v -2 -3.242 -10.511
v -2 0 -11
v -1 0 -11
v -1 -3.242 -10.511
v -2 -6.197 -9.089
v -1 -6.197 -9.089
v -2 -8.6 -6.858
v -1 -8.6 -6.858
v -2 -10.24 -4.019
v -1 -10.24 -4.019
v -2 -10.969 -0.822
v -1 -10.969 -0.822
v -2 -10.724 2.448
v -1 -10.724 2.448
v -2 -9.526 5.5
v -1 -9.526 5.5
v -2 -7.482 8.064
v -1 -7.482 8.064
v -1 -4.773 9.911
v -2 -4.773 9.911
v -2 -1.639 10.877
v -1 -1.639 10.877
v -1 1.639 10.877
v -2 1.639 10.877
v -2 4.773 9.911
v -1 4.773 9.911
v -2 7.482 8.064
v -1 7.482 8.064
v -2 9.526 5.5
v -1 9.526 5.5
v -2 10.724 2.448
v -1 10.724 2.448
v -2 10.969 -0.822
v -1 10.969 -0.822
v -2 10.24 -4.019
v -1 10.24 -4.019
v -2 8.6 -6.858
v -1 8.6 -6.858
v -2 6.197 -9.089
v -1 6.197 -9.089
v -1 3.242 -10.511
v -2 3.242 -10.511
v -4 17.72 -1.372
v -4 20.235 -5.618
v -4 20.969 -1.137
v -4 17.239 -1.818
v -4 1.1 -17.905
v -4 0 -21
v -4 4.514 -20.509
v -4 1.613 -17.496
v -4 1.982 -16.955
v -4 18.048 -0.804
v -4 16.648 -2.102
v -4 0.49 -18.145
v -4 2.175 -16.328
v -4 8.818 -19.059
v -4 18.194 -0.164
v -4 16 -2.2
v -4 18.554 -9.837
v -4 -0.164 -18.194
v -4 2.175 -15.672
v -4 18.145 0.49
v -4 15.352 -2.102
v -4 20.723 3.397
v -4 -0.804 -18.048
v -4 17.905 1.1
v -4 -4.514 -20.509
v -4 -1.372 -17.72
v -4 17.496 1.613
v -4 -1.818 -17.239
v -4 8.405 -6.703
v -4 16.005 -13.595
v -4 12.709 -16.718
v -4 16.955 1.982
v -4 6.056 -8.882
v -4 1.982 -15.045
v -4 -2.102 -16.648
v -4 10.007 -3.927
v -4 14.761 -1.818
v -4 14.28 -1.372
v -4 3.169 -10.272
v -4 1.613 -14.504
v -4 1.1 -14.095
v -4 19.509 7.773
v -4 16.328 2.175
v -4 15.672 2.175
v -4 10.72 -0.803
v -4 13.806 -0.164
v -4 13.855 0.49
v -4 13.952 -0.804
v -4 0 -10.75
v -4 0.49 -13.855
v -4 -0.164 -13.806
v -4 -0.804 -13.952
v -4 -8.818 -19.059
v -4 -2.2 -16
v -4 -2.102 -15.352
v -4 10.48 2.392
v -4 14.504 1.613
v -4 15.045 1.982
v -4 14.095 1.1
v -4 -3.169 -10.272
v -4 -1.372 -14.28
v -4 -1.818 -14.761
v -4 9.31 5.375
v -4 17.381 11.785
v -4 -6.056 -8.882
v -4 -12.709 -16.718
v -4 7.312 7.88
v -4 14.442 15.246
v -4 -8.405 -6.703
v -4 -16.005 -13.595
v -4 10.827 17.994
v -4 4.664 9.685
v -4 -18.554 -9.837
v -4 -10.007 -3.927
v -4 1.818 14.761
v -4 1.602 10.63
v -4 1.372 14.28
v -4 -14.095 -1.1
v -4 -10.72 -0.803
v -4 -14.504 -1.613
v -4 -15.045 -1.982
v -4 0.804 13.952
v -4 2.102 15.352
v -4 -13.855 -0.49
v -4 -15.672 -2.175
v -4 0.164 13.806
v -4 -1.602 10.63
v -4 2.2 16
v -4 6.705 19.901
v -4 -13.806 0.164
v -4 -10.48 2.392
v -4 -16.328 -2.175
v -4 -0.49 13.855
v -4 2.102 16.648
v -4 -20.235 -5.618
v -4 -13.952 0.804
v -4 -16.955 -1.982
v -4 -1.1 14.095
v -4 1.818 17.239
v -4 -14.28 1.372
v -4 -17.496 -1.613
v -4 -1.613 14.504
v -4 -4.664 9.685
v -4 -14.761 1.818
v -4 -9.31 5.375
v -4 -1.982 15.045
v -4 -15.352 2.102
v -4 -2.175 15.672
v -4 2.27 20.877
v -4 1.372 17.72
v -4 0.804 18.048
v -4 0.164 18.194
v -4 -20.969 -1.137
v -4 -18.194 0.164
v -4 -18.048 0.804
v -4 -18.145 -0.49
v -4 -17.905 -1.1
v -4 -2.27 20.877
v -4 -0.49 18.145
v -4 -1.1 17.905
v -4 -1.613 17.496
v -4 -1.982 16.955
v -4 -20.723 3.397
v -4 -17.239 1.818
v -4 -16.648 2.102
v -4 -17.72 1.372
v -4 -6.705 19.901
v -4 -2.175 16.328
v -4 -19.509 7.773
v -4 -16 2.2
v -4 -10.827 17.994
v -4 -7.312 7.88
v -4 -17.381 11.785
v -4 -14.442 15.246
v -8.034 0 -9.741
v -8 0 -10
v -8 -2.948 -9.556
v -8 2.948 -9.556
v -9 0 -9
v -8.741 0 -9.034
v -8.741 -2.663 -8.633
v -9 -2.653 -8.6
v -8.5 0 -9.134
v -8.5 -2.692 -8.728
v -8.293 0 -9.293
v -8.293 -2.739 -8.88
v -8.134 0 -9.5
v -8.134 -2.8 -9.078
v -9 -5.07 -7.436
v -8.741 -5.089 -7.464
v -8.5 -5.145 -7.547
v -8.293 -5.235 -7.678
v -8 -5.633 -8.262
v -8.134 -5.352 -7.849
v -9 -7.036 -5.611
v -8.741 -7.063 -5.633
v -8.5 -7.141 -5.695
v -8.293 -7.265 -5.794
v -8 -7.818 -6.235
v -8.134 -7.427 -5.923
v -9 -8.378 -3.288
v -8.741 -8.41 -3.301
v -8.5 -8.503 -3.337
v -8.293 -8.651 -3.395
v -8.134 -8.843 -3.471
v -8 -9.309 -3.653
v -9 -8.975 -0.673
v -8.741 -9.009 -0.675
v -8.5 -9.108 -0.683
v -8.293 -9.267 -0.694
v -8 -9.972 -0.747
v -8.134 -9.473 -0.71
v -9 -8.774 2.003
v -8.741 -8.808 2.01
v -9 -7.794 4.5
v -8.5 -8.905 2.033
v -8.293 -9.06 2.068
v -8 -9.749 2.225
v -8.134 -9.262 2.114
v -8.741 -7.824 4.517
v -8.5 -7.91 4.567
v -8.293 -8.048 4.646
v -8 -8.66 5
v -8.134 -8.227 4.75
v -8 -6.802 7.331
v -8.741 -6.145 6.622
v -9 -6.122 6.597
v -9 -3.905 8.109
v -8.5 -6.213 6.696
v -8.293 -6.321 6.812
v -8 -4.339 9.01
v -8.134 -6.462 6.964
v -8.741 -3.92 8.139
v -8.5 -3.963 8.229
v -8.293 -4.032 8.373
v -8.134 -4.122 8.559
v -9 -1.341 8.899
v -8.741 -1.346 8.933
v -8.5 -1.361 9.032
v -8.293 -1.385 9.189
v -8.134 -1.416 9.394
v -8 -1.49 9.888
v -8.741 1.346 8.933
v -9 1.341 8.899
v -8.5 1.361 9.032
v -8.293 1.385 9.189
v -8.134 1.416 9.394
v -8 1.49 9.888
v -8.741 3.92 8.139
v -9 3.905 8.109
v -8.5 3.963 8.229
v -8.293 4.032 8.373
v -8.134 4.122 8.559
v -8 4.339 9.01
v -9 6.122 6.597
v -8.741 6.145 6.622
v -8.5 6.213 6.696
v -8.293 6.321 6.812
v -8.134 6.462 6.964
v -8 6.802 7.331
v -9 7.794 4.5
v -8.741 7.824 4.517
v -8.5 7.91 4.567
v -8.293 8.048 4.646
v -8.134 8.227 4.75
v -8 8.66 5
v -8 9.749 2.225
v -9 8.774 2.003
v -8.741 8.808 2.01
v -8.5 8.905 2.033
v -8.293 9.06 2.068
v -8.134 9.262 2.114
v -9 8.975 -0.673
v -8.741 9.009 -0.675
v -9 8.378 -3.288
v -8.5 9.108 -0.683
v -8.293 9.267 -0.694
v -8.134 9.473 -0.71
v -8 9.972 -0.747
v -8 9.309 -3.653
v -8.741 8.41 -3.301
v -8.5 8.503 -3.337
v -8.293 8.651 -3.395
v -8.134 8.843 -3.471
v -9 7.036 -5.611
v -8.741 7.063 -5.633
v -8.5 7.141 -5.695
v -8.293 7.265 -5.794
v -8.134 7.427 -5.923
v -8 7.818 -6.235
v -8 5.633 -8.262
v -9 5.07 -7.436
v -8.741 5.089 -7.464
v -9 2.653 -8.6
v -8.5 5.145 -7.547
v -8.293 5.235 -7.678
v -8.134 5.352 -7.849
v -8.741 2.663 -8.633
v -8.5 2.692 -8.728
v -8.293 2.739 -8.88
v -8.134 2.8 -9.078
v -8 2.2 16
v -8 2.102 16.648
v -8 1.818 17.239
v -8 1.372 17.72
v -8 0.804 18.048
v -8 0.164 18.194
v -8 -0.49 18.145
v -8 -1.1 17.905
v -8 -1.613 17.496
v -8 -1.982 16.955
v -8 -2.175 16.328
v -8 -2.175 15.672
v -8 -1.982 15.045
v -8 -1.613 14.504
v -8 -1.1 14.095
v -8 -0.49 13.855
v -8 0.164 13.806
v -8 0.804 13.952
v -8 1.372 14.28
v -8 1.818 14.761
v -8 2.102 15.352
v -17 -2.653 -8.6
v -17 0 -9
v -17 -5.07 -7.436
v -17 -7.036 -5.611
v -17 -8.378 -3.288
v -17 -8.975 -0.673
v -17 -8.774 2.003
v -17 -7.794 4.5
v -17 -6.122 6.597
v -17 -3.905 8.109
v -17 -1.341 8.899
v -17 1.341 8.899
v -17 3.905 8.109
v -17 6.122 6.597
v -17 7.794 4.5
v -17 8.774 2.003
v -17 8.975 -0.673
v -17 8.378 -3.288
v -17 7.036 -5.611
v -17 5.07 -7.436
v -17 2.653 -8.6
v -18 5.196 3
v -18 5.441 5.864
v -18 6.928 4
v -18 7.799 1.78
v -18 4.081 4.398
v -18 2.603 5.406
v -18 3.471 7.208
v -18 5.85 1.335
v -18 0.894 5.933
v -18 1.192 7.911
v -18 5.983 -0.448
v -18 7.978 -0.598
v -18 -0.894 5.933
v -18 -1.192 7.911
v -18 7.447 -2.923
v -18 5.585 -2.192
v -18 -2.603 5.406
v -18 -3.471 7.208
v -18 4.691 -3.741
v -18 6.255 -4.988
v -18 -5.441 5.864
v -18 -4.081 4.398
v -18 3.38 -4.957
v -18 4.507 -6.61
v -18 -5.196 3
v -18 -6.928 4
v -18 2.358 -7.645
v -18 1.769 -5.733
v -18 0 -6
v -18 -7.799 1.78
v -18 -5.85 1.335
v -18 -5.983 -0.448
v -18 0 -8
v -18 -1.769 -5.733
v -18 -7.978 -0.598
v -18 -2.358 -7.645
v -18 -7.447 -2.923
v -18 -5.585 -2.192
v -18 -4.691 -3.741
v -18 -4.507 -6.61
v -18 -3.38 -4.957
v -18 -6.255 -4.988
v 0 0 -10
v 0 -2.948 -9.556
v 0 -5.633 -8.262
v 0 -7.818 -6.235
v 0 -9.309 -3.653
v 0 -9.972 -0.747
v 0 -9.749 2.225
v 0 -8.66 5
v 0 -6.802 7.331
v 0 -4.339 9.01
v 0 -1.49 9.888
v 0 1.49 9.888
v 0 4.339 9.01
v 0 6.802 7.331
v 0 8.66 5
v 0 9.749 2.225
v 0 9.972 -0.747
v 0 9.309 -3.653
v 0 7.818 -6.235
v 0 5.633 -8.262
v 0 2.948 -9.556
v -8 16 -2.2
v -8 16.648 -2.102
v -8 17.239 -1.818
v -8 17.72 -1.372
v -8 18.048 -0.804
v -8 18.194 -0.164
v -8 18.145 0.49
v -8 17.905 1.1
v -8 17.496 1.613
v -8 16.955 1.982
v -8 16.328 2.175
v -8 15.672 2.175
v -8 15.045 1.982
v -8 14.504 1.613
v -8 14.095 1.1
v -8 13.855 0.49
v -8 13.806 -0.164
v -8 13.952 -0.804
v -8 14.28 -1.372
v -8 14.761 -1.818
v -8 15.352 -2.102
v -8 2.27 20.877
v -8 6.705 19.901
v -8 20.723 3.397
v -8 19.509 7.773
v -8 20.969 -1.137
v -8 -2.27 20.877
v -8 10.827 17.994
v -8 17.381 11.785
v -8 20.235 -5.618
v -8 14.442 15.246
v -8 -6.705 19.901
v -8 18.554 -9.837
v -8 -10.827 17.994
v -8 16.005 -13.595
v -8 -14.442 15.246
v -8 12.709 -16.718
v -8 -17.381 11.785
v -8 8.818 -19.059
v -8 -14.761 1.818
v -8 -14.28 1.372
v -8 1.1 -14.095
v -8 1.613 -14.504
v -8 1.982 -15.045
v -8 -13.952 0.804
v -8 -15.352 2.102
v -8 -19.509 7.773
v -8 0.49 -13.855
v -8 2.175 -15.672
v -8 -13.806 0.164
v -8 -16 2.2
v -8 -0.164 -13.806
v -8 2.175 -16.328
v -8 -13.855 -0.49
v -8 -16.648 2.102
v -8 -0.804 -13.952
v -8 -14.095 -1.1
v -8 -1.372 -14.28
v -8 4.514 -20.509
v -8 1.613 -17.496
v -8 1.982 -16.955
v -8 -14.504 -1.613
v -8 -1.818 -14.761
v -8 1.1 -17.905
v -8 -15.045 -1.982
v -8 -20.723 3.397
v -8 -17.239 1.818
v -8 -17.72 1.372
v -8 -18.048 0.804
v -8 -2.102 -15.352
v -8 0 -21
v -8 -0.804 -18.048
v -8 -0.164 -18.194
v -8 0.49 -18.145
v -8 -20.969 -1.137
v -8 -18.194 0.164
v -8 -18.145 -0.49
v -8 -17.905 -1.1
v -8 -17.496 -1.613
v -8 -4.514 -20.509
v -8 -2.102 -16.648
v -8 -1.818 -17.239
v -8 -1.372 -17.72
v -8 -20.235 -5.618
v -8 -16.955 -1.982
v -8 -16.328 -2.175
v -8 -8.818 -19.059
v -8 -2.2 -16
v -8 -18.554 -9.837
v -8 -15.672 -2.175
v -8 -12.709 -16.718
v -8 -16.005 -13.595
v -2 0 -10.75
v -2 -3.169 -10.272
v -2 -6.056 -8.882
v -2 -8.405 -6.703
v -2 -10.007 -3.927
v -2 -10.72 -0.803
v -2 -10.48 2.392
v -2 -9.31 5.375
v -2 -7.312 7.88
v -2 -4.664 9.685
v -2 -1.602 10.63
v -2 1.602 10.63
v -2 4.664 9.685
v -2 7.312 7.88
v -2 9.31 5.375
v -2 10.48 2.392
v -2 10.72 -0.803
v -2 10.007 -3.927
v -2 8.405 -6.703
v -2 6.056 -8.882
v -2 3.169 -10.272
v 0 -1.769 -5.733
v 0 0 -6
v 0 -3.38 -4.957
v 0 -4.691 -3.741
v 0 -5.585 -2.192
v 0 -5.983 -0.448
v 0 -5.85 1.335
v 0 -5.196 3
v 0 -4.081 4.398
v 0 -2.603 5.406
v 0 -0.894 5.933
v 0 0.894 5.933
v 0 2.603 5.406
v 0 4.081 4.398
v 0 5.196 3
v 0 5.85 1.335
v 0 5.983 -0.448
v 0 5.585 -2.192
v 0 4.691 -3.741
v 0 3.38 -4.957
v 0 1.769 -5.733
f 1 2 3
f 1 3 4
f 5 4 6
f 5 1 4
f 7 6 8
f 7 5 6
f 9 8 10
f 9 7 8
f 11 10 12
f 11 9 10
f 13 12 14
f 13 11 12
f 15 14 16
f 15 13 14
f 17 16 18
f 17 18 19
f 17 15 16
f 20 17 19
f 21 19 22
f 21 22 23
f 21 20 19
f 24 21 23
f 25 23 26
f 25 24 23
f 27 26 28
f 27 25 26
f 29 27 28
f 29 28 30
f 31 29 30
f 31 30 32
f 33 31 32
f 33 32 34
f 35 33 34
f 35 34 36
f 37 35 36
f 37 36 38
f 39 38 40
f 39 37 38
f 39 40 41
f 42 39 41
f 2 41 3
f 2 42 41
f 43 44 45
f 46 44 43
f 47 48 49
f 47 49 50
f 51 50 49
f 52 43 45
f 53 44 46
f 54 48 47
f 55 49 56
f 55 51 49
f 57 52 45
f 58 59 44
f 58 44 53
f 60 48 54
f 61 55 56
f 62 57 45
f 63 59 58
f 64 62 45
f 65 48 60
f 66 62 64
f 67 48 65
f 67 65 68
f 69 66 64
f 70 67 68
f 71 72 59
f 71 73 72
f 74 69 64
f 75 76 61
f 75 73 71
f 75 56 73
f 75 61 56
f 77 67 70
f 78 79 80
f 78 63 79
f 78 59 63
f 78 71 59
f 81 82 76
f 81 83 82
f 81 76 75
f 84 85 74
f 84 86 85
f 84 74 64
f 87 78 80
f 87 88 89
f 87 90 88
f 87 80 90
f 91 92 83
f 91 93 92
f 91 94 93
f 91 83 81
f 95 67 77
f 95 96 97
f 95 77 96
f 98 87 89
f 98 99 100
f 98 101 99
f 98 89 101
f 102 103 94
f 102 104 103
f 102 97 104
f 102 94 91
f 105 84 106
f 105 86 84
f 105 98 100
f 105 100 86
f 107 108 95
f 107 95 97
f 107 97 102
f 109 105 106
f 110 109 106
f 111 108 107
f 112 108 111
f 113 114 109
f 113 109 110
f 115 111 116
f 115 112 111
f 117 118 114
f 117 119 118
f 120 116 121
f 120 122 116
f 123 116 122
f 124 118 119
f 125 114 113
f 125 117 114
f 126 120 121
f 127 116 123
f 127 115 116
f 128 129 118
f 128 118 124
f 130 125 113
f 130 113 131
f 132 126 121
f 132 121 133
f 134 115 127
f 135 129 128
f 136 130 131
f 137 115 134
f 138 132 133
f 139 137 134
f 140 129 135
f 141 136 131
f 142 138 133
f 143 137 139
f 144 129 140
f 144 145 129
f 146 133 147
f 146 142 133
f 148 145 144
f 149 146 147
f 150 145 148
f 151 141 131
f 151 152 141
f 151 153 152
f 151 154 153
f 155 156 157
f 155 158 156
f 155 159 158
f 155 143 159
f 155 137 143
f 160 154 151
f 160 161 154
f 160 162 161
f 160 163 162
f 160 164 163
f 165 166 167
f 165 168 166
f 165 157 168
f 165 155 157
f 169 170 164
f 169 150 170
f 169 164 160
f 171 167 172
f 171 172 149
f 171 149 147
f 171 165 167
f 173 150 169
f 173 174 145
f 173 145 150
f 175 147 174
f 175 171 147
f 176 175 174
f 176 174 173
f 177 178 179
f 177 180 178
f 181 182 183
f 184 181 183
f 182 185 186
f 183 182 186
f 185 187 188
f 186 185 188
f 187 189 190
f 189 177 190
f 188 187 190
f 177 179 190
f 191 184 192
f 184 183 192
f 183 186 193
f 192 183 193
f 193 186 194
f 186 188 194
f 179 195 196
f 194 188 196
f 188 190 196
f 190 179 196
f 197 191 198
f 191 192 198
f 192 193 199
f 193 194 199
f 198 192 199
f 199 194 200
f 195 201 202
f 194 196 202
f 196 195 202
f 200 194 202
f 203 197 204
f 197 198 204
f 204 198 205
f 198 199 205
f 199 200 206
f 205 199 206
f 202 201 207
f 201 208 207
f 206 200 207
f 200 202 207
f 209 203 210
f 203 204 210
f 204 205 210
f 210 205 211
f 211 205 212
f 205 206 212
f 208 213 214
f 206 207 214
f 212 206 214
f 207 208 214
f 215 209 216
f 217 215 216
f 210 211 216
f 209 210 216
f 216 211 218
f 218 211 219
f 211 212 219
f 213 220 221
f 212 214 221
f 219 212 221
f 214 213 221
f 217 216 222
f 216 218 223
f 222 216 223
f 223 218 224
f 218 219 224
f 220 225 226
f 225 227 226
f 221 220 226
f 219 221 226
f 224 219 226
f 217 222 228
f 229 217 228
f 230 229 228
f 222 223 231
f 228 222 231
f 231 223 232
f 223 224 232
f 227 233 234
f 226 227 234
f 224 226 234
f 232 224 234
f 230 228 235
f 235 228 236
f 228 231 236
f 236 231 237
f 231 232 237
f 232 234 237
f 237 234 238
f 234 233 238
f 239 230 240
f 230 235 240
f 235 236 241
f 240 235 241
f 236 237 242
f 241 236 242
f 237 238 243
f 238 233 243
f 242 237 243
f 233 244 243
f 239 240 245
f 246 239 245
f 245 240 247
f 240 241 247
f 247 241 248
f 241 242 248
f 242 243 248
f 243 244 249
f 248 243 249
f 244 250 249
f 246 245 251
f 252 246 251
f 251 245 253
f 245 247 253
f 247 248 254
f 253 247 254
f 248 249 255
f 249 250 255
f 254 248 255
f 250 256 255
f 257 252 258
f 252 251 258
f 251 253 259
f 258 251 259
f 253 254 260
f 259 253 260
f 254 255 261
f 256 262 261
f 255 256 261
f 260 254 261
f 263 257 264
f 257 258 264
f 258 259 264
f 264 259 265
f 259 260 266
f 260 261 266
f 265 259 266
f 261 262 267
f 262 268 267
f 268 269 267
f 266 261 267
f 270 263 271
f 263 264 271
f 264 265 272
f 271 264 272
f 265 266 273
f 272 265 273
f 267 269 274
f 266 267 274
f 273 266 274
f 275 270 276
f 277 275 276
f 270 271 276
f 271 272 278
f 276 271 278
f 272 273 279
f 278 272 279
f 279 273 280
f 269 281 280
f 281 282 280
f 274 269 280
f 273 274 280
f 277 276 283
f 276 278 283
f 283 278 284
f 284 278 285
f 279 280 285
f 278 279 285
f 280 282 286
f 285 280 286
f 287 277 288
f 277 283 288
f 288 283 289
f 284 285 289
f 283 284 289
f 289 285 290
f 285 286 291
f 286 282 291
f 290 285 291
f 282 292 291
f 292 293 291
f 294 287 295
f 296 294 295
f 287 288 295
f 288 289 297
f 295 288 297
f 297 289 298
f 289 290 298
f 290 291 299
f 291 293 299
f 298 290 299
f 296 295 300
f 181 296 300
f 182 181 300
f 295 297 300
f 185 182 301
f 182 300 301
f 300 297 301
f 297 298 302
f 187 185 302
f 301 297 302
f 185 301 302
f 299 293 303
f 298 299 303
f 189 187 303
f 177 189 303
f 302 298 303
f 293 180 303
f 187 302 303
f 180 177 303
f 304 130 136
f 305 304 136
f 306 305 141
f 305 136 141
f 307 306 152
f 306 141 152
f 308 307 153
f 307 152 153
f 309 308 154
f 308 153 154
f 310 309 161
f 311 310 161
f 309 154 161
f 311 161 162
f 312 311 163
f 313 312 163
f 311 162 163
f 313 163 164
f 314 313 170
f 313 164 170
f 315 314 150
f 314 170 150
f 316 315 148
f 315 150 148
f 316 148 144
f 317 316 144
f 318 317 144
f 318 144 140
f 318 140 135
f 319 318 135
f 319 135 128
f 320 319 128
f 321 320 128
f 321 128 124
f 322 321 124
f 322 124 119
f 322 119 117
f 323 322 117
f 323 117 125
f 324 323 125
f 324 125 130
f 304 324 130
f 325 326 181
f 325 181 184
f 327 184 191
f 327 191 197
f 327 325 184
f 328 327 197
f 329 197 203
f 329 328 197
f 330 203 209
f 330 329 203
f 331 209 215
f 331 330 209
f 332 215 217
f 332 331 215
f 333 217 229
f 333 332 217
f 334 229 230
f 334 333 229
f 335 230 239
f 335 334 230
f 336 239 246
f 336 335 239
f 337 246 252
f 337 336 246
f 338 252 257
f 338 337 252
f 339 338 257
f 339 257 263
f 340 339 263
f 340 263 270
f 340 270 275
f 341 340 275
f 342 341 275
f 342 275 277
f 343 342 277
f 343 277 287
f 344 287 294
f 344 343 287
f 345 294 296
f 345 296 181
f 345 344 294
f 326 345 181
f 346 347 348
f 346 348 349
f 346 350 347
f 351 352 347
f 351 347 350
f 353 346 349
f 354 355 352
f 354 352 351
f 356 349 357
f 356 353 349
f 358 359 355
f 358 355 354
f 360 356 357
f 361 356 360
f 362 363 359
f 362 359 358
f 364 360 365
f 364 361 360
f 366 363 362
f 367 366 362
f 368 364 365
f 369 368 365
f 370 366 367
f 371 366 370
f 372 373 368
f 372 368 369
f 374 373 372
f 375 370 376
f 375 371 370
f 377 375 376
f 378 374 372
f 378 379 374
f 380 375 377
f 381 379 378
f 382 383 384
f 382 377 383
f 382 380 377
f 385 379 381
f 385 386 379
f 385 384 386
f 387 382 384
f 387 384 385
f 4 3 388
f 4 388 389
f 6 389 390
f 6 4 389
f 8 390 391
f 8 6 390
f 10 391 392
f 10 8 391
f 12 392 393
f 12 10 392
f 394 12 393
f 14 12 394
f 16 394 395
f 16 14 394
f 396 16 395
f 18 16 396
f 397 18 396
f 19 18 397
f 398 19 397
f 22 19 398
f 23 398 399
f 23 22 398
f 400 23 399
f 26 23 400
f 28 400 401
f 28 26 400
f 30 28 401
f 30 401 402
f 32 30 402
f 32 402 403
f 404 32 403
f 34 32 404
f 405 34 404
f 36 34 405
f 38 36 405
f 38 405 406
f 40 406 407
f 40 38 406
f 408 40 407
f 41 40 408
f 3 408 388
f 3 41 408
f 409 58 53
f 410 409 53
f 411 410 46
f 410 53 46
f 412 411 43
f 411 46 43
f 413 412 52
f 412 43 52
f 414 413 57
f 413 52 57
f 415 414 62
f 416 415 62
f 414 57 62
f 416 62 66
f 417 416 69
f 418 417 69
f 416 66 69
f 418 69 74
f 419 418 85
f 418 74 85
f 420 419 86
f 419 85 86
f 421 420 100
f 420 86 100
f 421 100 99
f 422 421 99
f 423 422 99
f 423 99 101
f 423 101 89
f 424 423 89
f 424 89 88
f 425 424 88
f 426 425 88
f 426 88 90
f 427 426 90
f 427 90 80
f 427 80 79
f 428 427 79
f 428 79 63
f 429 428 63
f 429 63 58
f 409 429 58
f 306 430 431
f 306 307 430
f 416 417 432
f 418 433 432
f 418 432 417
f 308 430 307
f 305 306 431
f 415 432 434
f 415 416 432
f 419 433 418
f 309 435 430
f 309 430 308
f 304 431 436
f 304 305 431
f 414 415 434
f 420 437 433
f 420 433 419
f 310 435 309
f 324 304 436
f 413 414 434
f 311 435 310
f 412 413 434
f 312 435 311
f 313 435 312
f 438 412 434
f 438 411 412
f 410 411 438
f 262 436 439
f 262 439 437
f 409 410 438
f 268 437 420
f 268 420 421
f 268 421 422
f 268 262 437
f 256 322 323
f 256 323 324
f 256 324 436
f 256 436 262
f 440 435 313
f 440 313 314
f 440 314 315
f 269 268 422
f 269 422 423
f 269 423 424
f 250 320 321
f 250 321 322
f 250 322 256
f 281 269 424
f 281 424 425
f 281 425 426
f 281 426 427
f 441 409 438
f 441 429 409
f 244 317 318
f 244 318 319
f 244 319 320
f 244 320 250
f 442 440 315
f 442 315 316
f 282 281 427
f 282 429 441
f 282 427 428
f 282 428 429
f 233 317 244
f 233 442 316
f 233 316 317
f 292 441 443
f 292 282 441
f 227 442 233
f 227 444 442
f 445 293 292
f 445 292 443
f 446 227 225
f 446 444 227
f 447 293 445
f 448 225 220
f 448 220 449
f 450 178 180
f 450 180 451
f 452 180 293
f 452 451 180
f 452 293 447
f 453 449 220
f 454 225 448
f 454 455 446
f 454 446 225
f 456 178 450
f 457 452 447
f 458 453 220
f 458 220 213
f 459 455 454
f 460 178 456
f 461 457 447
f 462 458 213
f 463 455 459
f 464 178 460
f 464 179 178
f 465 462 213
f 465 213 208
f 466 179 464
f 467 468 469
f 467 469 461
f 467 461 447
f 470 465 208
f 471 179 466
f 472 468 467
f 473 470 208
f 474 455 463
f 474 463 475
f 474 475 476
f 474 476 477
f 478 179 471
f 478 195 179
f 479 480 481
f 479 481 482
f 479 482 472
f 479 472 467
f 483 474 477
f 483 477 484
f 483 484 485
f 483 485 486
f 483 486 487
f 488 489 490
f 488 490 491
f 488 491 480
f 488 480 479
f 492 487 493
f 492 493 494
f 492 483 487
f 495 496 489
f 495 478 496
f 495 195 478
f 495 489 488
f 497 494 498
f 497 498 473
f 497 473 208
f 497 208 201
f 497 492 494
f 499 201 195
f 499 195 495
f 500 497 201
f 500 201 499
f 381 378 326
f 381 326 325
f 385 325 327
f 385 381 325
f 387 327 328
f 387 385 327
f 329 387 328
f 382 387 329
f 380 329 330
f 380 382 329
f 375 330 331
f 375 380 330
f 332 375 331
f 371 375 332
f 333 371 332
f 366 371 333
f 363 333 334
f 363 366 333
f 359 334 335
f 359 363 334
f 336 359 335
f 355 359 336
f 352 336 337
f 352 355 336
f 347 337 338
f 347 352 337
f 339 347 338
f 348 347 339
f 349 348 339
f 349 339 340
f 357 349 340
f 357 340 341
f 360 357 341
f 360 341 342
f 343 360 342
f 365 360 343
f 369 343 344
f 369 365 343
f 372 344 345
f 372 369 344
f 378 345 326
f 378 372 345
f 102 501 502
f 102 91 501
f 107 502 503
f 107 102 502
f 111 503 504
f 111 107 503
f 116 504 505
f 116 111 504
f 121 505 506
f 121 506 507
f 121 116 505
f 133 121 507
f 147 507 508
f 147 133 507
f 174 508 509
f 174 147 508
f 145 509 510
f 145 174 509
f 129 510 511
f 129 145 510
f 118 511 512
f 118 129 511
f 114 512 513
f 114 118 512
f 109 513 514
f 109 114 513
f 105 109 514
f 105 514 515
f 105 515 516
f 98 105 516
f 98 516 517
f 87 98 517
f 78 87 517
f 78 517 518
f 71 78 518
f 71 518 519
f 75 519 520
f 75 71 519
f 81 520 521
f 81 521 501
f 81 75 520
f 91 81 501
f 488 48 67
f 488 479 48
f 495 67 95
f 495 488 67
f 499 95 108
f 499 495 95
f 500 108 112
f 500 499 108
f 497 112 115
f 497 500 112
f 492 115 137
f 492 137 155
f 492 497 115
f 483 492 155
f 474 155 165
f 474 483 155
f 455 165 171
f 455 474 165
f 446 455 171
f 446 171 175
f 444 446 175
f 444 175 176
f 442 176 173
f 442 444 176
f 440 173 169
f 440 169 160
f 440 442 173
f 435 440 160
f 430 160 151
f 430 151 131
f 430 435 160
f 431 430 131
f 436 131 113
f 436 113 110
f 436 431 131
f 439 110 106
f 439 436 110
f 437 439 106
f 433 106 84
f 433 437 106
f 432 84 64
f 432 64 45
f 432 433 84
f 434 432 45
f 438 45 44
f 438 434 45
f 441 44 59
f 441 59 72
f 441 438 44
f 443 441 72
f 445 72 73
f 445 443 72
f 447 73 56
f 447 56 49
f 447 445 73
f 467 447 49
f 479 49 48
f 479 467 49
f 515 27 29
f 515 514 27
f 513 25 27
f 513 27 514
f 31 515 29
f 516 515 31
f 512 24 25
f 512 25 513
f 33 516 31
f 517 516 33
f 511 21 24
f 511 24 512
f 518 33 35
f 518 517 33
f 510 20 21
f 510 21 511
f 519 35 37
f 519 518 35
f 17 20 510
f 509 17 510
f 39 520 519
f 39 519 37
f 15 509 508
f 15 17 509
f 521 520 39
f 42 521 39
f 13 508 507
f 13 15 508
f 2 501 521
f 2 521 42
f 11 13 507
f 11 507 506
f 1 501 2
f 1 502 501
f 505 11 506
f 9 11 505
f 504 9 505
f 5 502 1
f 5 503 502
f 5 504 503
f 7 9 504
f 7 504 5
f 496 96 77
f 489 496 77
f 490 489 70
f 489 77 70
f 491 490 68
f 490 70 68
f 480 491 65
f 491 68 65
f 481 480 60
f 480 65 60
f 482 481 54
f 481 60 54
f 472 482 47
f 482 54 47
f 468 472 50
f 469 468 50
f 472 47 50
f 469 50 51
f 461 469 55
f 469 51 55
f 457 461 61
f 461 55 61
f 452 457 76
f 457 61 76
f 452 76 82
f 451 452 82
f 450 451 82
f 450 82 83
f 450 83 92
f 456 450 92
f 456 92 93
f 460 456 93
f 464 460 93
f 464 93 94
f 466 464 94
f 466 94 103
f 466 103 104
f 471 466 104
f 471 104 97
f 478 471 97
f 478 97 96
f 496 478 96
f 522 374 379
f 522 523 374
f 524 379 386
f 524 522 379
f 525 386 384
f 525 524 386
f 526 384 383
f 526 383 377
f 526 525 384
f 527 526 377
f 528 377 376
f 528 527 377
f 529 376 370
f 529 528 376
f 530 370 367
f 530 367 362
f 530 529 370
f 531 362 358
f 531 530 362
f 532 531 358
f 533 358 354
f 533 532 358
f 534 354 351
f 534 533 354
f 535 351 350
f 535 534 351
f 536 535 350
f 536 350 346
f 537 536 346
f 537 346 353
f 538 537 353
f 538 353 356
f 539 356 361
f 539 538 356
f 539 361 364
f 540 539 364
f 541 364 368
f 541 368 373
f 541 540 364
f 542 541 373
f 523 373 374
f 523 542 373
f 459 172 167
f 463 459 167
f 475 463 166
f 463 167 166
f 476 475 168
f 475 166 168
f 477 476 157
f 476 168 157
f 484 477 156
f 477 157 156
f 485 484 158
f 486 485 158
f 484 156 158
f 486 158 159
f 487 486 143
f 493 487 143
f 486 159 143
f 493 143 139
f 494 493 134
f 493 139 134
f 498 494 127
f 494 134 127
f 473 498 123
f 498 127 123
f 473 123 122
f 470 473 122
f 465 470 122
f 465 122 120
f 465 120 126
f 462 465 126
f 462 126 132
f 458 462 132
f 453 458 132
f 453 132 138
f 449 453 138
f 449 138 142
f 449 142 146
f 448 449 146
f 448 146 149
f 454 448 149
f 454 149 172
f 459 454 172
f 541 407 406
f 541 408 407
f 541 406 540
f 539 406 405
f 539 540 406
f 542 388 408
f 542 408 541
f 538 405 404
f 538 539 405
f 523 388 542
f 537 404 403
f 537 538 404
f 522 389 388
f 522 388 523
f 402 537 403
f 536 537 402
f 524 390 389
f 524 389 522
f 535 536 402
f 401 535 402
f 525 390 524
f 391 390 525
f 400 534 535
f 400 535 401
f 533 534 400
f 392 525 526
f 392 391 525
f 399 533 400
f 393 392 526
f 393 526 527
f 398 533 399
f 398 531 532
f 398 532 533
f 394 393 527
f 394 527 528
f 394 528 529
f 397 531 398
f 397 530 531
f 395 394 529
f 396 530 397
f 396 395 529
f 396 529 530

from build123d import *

# Parameters (mm, degrees)
SKETCH_2_R               = 2.2
CUT_EXTRUDE_1_DEPTH      = 33.832910319
PATTERN_CIRCULAR_1_COUNT = 4
FILLET_1_R               = 1
CHAMFER_1_SIZE           = 1


with BuildPart() as part:
    # Эскиз1 → Повернуть1 (revolve)
    with BuildSketch(Plane.XY, mode=Mode.PRIVATE) as revolve_1_sk:
        Polygon((0, -6), (0, -11), (-2, -11), (-2, -10.75), (-4, -10.75), (-4, -21), (-8, -21), (-8, -9), (-18, -9), (-18, -6), align=None)
    revolve(revolve_1_sk.sketch.rotate(Axis((0, 0, 0), (-1, 0, 0)), 270), axis=Axis((0, 0, 0), (-1, 0, 0)))

    # Эскиз2 → Вырез-Вытянуть1 (cut, through all)
    with BuildSketch(Plane(origin=(-4, 0, 0), x_dir=(0, 0, -1), z_dir=(1, 0, 0))):
        with Locations((0, 16)):
            Circle(SKETCH_2_R)
    cut_extrude_1 = extrude(amount=-CUT_EXTRUDE_1_DEPTH, mode=Mode.SUBTRACT)

    # Круговой массив1: Вырез-Вытянуть1 ×4 about axis
    pattern_circular_1_axis = Axis((0, 0, 0), (1, 0, 0))
    for i in range(1, PATTERN_CIRCULAR_1_COUNT):
        add(cut_extrude_1.rotate(pattern_circular_1_axis, i * 360 / PATTERN_CIRCULAR_1_COUNT), mode=Mode.SUBTRACT)

    # Скругление1
    fillet_1_edges = [part.edges().sort_by_distance(p)[0] for p in [
        (-8, 0, 9),
    ]]
    fillet(fillet_1_edges, radius=FILLET_1_R)

    # Фаска1
    chamfer_1_edges = [part.edges().sort_by_distance(p)[0] for p in [
        (0, 0, 11),
        (-18, 0, 9),
    ]]
    chamfer(chamfer_1_edges, length=CHAMFER_1_SIZE)


solid = part.part
